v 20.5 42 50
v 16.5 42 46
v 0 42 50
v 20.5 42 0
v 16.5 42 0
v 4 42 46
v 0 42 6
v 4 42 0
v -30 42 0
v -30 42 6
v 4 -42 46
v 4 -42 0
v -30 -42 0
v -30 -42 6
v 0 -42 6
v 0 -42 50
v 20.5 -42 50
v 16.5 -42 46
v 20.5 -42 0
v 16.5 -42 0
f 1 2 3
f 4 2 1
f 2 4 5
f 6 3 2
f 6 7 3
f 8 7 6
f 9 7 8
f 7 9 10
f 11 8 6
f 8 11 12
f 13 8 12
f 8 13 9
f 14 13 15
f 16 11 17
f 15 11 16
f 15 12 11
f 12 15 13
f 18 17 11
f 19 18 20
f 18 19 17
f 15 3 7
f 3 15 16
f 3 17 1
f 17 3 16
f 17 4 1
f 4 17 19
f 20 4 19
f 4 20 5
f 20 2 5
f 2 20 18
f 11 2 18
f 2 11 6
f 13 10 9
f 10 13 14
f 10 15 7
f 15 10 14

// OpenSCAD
// 8-tube PCR strip holder that hooks over a 12 mm ice-bucket wall.
// Printed as used: rests on the XY plane at z = 0, builds upward (+Z), centred on x = 0.
// The part is a profile in the YZ plane extruded 84 mm along X.
// We build the profile in the XY plane (x = Y, y = Z) and extrude along Z,
// then rotate 90 deg about X so the extrusion axis becomes X and Z stays Z.

$fn = 64;

// ---- Dimensions (mm) ----
extrude_x   = 84;    // length of the part along X

// Upside-down U profile (Y = horizontal, Z = vertical)
inner_leg_y0 = 0;    // inner face of inner leg
inner_leg_y1 = 4;    // outer face of inner leg (wall 12 mm -> 12.5 mm gap)
outer_leg_y0 = 16.5; // inner face of outer leg
outer_leg_y1 = 20.5; // outer face of outer leg
leg_z0       = 0;    // bottom of both legs
leg_z1       = 50;   // top of both legs
bridge_z0    = 46;   // bottom of top bridge
bridge_z1    = 50;   // top of top bridge
// gap between inner and outer legs = 16.5 - 4 = 12.5 mm (clears 12 mm wall)

// Flat ledge reaching into the ice
ledge_y0     = -30;  // far end of ledge (toward -Y)
ledge_y1     = 0;    // meets the foot of the inner leg
ledge_z0     = 0;    // bottom of ledge
ledge_z1     = 6;    // top of ledge (6 mm thick)

// Tube holes
hole_d       = 6.4;  // through-hole diameter
hole_pitch   = 9;    // spacing along X
hole_y       = -15;  // hole centre in Y
hole_z0      = -1;   // extend below z = 0
hole_z1      = 7;    // extend above ledge top (6)

// ---- Build the part ----
module part() {
    rotate([90, 0, 0]) {   // extrusion axis (Z) -> X ; profile y (Z) -> Z
        difference() {
            union() {
                // Inner leg (profile in XY: x = Y, y = Z)
                linear_extrude(height = extrude_x, center = true) {
                    polygon(points = [
                        [inner_leg_y0, leg_z0],
                        [inner_leg_y1, leg_z0],
                        [inner_leg_y1, leg_z1],
                        [inner_leg_y0, leg_z1]
                    ]);
                }
                // Outer leg
                linear_extrude(height = extrude_x, center = true) {
                    polygon(points = [
                        [outer_leg_y0, leg_z0],
                        [outer_leg_y1, leg_z0],
                        [outer_leg_y1, leg_z1],
                        [outer_leg_y0, leg_z1]
                    ]);
                }
                // Top bridge spanning the 12.5 mm gap
                linear_extrude(height = extrude_x, center = true) {
                    polygon(points = [
                        [inner_leg_y1, bridge_z0],
                        [outer_leg_y0, bridge_z0],
                        [outer_leg_y0, bridge_z1],
                        [inner_leg_y1, bridge_z1]
                    ]);
                }
                // Flat ledge reaching toward -Y from the foot of the inner leg
                linear_extrude(height = extrude_x, center = true) {
                    polygon(points = [
                        [ledge_y0, ledge_z0],
                        [ledge_y1, ledge_z0],
                        [ledge_y1, ledge_z1],
                        [ledge_y0, ledge_z1]
                    ]);
                }
            }

            // Eight vertical 6.4 mm through-holes in the ledge, 9 mm apart along X, centred
            for (i = [-3, -2, -1, 0, 1, 2, 3, 4]) {
                x_pos = -31.5 + i * hole_pitch;   // -31.5 .. +31.5, centred on x = 0
                translate([x_pos, hole_y, 0]) {
                    cylinder(h = hole_z1 - hole_z0, r = hole_d / 2, center = false);
                }
            }
        }
    }
}

part();
